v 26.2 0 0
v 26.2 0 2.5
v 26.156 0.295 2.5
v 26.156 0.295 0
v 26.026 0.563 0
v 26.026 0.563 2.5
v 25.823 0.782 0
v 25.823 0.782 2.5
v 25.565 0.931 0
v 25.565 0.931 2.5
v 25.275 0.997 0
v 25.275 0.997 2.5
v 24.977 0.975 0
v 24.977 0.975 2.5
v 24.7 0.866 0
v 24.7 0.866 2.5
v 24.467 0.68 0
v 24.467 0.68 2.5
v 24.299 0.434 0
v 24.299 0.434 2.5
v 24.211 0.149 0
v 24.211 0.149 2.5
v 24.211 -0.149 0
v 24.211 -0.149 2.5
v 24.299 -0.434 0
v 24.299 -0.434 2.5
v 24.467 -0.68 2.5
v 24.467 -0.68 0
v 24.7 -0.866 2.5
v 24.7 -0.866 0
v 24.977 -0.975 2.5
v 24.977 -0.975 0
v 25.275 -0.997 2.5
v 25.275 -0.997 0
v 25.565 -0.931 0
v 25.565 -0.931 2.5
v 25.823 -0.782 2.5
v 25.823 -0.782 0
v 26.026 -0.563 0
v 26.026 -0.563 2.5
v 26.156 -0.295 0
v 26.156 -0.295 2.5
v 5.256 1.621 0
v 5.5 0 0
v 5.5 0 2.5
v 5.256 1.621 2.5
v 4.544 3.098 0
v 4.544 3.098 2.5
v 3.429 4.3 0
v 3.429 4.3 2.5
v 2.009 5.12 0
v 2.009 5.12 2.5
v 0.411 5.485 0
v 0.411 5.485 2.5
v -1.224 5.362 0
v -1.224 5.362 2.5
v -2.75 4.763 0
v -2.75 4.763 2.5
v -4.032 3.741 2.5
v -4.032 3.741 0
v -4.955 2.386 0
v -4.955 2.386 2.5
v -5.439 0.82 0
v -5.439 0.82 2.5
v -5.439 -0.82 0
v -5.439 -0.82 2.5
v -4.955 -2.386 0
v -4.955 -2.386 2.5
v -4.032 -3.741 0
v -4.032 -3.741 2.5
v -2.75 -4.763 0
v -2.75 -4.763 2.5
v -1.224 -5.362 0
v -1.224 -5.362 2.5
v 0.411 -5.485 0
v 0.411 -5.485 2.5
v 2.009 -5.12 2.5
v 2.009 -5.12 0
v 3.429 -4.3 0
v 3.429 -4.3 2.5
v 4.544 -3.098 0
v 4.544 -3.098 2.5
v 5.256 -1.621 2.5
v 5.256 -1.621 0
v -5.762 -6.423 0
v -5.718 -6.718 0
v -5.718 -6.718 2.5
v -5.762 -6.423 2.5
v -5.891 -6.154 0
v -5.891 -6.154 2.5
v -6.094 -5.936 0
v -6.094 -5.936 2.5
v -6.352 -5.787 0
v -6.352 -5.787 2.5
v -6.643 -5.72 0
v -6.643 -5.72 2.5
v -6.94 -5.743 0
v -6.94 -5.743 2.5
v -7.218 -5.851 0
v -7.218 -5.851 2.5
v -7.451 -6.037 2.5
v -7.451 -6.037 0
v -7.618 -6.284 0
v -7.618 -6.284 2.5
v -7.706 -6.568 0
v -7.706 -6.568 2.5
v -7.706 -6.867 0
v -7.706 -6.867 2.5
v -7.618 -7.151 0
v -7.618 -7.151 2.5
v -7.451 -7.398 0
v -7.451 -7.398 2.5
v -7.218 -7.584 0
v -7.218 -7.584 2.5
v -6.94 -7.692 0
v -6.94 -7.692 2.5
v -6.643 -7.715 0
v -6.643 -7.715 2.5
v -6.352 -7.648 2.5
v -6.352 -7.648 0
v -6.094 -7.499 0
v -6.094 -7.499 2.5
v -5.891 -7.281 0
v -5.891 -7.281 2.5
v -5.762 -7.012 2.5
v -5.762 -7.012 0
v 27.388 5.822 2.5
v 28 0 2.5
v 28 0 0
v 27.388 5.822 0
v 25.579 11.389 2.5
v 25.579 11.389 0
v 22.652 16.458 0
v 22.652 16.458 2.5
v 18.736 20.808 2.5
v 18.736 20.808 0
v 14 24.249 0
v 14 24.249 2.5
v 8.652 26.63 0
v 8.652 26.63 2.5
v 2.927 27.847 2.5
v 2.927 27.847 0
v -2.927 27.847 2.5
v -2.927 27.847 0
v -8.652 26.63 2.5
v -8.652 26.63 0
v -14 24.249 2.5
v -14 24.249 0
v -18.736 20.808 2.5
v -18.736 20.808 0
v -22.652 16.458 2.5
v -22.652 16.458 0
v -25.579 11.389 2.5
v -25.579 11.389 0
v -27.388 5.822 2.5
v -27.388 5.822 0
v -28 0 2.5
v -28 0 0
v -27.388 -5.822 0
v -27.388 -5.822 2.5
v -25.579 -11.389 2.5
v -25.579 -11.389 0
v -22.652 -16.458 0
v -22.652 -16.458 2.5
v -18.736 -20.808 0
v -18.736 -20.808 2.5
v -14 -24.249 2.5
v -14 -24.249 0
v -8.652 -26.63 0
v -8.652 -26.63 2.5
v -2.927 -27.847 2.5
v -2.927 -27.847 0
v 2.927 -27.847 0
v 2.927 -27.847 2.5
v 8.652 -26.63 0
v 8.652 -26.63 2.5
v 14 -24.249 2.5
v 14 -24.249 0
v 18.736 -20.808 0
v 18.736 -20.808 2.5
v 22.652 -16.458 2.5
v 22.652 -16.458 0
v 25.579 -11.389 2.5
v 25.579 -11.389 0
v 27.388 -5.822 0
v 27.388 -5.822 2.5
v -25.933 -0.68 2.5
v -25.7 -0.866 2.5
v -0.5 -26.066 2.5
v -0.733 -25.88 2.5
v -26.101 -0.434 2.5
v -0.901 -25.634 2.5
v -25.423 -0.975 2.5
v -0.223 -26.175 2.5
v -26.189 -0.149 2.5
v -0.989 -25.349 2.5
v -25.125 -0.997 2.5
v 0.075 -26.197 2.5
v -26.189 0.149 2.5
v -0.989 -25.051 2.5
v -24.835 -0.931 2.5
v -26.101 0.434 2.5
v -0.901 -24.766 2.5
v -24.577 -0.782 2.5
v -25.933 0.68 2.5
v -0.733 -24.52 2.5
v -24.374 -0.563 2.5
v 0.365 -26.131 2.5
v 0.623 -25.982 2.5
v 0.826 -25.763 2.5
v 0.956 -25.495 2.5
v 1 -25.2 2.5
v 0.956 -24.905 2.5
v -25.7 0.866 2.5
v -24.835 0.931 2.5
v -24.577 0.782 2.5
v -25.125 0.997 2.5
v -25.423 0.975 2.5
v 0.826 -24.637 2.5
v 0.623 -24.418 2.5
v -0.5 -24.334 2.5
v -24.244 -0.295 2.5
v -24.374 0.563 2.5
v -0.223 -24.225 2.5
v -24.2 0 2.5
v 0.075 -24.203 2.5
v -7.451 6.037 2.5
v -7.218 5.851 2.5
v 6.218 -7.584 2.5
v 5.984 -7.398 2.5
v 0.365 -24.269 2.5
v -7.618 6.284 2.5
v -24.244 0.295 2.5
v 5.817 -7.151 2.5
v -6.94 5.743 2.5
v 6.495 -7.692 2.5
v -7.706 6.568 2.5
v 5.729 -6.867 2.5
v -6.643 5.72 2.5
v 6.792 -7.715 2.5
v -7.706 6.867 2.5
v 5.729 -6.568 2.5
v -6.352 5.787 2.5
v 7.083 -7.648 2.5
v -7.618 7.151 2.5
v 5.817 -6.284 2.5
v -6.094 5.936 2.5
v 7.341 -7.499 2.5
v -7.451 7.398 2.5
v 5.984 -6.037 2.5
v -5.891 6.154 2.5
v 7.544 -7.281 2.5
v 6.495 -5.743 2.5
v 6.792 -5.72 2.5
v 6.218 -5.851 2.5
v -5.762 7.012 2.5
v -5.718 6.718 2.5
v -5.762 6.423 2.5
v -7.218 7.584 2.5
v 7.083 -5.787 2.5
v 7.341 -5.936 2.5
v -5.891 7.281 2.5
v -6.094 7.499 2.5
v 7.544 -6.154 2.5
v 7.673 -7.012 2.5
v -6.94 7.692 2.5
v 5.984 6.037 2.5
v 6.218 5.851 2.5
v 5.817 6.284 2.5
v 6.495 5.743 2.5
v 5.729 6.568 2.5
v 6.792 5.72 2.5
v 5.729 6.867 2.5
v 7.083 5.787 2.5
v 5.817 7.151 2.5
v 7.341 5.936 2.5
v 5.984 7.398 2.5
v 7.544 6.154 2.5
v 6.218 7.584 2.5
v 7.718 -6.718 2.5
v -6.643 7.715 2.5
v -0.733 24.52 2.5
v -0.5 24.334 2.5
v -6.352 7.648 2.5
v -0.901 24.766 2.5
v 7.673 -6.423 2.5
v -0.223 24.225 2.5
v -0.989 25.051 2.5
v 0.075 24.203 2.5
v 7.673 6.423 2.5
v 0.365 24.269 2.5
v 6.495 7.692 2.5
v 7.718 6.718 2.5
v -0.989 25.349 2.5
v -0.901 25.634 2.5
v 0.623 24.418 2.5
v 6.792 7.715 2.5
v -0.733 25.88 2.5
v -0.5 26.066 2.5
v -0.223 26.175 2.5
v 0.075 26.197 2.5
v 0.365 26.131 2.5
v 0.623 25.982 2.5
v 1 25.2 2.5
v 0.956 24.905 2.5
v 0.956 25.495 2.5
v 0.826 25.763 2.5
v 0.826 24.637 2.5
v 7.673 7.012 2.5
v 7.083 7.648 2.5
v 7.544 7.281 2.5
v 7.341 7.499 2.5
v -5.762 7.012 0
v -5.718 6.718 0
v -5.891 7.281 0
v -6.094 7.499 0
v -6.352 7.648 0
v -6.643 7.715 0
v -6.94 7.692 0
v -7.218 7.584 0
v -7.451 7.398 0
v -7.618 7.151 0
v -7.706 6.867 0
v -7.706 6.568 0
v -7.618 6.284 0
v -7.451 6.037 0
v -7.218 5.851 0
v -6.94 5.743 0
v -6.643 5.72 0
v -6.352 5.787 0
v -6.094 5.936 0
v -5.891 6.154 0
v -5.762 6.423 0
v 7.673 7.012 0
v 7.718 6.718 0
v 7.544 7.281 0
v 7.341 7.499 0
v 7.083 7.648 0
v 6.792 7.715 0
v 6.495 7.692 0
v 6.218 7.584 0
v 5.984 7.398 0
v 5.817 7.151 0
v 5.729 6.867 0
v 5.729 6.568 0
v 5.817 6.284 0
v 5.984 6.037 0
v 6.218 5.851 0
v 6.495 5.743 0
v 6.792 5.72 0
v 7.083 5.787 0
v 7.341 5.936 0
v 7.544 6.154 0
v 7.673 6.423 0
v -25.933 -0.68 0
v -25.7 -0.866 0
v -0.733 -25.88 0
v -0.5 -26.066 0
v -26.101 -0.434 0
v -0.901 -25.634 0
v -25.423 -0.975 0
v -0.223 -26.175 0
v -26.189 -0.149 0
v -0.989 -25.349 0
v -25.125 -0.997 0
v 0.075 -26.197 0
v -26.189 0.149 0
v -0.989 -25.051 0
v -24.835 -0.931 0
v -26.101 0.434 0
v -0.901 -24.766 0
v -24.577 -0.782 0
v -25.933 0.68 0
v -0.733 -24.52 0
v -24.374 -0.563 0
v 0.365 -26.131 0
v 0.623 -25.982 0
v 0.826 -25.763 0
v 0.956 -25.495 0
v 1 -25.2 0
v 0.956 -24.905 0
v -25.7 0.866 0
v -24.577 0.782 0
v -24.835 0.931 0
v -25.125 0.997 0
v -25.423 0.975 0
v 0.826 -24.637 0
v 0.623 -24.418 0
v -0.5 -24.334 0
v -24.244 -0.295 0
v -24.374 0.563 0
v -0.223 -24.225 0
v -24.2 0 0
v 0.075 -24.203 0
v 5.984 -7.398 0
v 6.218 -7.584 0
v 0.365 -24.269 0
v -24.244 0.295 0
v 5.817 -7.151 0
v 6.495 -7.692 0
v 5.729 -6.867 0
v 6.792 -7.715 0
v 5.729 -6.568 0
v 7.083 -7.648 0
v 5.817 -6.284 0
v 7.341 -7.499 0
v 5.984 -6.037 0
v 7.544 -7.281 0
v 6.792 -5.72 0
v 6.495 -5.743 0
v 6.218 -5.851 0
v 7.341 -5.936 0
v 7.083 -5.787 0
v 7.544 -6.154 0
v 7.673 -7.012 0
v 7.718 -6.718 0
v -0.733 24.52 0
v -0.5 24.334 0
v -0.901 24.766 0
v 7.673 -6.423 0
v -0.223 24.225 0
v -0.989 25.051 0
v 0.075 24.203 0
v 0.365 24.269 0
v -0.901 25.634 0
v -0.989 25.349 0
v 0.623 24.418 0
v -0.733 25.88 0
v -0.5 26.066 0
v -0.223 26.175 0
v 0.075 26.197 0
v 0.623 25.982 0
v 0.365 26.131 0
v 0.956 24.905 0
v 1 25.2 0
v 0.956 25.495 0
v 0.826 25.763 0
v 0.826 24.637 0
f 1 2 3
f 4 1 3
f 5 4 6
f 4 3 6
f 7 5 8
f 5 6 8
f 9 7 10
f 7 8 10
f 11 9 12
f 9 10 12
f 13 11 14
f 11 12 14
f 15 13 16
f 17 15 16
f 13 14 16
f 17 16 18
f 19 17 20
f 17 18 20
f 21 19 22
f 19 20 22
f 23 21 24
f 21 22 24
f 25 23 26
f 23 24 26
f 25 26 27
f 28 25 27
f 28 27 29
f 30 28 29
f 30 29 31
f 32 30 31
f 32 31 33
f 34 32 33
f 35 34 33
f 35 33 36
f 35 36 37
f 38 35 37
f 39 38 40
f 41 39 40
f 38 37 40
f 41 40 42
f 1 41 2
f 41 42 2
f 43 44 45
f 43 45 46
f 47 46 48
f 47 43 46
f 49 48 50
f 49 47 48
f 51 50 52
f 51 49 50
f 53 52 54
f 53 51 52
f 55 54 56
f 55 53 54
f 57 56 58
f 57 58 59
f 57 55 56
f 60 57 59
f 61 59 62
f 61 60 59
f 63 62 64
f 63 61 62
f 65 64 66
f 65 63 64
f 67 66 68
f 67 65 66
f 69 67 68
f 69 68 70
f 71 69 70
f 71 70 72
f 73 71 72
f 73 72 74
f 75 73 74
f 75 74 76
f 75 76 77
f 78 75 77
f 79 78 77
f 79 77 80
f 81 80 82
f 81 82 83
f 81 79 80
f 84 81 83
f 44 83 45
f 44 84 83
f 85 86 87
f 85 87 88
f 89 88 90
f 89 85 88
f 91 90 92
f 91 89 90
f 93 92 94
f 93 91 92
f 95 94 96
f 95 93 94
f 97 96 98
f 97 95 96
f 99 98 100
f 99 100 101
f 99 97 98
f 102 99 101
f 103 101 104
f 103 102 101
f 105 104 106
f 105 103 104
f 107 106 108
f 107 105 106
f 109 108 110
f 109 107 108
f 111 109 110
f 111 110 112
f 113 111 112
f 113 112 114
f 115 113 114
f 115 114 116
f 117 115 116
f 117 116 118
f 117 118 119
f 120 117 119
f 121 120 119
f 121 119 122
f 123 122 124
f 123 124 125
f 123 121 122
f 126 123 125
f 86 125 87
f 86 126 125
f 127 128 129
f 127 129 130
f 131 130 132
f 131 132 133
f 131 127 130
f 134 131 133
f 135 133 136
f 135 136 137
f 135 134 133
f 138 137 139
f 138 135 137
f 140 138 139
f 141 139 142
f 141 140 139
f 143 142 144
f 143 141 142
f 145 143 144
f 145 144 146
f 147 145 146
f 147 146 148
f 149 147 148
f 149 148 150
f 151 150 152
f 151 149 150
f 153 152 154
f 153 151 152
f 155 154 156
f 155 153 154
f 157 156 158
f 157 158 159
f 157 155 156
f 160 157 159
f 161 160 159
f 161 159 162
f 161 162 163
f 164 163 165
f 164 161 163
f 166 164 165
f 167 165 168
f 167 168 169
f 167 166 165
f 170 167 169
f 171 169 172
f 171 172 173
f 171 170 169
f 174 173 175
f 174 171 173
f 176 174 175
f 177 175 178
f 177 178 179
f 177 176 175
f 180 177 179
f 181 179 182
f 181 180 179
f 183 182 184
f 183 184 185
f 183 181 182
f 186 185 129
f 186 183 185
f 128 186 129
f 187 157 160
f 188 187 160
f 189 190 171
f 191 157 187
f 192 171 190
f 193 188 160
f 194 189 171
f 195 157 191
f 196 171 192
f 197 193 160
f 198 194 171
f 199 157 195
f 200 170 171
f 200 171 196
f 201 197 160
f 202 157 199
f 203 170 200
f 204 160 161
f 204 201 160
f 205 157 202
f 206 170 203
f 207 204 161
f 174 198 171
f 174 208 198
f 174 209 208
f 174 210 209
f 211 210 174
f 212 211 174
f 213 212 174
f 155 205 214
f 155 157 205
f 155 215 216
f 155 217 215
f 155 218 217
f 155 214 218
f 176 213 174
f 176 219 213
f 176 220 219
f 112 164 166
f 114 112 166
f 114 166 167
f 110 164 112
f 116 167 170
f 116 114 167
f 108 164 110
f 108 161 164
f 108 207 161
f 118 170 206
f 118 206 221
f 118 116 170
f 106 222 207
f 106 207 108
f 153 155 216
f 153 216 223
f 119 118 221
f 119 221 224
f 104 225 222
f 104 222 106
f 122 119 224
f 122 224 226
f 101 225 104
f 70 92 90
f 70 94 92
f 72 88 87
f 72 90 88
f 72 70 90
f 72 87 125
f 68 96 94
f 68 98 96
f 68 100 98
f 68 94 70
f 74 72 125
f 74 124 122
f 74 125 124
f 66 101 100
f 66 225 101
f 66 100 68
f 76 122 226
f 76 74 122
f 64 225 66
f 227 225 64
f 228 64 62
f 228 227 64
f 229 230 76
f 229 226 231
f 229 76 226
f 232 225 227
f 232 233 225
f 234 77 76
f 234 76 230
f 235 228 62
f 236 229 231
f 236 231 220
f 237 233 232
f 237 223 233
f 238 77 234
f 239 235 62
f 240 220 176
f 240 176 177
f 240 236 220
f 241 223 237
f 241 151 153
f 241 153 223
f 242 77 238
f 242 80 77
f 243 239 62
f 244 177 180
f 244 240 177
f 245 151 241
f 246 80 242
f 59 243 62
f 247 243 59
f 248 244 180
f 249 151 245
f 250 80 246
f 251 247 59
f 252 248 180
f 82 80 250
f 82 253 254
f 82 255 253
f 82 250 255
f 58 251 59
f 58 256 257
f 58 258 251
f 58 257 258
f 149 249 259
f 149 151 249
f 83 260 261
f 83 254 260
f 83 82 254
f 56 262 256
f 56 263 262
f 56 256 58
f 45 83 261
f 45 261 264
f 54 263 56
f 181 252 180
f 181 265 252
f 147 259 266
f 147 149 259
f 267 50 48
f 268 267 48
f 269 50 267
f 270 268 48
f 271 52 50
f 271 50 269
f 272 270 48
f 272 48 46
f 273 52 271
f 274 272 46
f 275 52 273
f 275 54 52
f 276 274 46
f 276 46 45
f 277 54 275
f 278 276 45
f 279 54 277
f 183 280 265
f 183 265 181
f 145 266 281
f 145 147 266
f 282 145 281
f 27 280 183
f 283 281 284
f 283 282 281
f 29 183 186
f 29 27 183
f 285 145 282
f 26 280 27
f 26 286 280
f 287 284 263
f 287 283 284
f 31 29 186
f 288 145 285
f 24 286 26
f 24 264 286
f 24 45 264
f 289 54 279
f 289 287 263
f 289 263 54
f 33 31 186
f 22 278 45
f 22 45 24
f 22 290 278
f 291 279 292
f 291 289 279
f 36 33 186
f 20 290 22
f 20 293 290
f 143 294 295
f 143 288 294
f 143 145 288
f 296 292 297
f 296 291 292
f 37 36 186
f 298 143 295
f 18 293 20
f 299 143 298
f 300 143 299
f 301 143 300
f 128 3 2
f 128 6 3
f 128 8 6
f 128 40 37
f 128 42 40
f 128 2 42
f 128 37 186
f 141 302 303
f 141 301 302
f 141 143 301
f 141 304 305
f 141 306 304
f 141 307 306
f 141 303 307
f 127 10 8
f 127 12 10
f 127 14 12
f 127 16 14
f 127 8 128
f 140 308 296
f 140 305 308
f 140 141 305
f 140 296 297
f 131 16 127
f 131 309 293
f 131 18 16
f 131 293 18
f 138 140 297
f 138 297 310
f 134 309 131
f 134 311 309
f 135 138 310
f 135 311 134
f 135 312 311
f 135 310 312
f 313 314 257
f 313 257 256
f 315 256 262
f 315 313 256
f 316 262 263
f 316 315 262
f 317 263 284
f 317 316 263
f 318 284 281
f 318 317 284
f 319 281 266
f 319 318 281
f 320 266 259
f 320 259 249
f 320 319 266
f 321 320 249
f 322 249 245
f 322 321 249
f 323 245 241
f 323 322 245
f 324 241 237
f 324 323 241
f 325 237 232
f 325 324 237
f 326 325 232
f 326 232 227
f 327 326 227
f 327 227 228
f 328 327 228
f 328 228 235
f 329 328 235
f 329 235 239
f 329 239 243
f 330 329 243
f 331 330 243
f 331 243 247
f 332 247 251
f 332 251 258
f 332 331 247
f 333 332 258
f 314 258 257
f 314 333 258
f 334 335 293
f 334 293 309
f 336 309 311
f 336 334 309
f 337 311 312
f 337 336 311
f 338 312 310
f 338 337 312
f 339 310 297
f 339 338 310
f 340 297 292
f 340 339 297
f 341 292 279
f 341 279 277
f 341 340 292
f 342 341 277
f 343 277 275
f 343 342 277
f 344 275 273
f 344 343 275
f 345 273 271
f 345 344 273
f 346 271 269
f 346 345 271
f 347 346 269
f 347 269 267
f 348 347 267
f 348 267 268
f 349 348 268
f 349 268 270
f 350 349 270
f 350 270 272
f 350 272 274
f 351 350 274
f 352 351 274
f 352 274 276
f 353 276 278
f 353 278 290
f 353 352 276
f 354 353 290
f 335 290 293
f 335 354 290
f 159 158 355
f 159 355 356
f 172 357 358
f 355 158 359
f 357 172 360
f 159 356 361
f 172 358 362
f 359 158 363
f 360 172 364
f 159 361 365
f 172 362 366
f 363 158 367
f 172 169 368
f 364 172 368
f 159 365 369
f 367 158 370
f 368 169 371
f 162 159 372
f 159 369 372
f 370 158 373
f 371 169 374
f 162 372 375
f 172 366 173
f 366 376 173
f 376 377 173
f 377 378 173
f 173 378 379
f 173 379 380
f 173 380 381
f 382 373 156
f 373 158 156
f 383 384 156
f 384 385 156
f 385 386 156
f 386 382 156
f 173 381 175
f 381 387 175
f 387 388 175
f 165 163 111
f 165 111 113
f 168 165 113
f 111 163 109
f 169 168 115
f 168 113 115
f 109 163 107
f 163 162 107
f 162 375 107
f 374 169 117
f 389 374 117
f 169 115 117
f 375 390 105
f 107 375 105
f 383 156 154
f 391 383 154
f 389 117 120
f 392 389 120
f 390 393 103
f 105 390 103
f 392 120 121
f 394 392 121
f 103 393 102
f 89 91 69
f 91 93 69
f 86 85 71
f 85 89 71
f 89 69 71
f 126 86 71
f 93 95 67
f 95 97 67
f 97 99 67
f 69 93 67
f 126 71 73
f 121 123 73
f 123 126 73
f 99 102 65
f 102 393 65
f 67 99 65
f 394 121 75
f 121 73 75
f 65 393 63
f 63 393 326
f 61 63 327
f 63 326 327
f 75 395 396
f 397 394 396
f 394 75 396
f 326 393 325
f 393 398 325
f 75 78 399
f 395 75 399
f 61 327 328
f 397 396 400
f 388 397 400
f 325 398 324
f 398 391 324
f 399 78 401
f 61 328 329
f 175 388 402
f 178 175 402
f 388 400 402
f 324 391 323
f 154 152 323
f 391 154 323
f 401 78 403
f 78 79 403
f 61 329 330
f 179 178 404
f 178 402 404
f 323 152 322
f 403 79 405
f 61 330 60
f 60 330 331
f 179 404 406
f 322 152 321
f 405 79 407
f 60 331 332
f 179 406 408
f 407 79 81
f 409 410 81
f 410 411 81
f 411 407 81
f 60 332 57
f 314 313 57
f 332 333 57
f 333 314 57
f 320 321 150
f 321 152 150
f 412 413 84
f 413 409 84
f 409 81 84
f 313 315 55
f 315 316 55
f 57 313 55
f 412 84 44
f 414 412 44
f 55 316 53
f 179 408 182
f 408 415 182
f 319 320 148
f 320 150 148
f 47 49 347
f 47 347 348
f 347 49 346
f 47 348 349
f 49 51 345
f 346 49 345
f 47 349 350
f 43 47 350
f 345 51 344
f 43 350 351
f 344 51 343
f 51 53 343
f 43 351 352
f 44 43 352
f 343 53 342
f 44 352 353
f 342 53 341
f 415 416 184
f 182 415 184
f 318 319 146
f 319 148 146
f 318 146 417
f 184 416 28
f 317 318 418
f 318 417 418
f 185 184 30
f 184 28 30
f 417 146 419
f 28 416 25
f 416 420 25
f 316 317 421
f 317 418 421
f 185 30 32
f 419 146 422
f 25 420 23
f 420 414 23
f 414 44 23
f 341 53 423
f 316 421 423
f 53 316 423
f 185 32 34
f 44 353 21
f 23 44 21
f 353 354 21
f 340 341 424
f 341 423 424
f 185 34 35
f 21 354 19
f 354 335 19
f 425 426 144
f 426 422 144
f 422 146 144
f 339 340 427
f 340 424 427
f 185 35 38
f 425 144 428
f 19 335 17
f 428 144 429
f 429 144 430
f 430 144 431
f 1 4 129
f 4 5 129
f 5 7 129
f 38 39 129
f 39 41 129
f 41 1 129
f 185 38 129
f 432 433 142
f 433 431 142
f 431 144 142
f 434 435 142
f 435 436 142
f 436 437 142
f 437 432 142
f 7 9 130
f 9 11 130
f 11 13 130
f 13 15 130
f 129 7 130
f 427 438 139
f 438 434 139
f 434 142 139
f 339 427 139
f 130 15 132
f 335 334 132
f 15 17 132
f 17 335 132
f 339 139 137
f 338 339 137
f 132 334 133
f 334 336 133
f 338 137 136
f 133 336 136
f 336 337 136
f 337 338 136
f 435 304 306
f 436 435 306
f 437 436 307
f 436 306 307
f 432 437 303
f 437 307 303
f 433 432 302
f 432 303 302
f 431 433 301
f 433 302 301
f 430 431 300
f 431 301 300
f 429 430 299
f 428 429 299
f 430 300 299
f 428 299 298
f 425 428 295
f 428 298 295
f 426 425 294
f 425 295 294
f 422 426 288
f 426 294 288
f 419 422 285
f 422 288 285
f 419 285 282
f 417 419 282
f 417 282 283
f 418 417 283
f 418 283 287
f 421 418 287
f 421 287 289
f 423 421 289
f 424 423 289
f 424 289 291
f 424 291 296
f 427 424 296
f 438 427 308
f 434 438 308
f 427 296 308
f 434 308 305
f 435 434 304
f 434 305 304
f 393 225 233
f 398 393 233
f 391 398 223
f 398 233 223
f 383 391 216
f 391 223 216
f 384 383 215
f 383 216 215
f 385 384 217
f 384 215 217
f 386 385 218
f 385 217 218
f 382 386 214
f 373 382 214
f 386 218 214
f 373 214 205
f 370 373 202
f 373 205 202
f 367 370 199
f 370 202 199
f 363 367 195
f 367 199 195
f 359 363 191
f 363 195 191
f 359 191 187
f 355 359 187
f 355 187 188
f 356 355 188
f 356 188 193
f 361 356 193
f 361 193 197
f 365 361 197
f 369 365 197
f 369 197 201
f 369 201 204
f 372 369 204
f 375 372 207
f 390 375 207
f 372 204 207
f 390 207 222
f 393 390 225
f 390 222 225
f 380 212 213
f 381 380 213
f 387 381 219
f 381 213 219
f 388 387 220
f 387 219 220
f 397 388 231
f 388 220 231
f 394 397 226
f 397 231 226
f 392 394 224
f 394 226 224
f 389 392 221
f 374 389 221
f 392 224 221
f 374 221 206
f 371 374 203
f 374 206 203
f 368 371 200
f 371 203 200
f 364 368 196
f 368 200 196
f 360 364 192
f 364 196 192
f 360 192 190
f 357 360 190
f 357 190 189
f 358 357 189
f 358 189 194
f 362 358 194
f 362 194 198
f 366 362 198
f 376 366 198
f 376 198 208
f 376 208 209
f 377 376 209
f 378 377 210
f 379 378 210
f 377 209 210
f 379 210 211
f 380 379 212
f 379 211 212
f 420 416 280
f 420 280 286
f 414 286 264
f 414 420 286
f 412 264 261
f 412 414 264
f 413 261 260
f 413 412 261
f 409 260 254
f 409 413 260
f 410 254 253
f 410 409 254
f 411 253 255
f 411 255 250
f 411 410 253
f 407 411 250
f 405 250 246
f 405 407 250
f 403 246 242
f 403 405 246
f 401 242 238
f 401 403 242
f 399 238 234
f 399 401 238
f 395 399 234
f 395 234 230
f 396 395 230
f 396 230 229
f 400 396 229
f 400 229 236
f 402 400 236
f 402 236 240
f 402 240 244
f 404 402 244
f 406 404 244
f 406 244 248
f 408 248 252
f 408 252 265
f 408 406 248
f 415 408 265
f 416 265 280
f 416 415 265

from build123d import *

# Parameters (mm, degrees)
CROQUIS1_W              = 65
CROQUIS1_H              = 65
CROQUIS1_R              = 5.5
CROQUIS1_R_2            = 1
SALIENTE_EXTRUIR1_DEPTH = 2.5
REDONDEO1_R             = 15
CROQUIS5_R              = 47.665857464
CROQUIS5_R_2            = 28
CORTAR_EXTRUIR3_DEPTH   = 2.5
CROQUIS7_R              = 1
CORTAR_EXTRUIR4_DEPTH   = 2.5


with BuildPart() as part:
    # Croquis1 → Saliente-Extruir1 (new body)
    with BuildSketch(Plane.XY):
        Rectangle(CROQUIS1_W, CROQUIS1_H)
        Circle(CROQUIS1_R, mode=Mode.SUBTRACT)
        with Locations((-6.717514421, 6.717514421)):
            Circle(CROQUIS1_R_2, mode=Mode.SUBTRACT)
        with Locations((6.717514421, 6.717514421)):
            Circle(CROQUIS1_R_2, mode=Mode.SUBTRACT)
        with Locations((6.717514421, -6.717514421)):
            Circle(CROQUIS1_R_2, mode=Mode.SUBTRACT)
        with Locations((-6.717514421, -6.717514421)):
            Circle(CROQUIS1_R_2, mode=Mode.SUBTRACT)
    extrude(amount=SALIENTE_EXTRUIR1_DEPTH)

    # Redondeo1
    redondeo1_edges = [part.edges().sort_by_distance(p)[0] for p in [
        (32.5, -32.5, 1.25),
        (-32.5, -32.5, 1.25),
        (-32.5, 32.5, 1.25),
        (32.5, 32.5, 1.25),
    ]]
    fillet(redondeo1_edges, radius=REDONDEO1_R)

    # Croquis5 → Cortar-Extruir3 (cut)
    with BuildSketch(Plane.XY.offset(2.5)):
        Circle(CROQUIS5_R)
        Circle(CROQUIS5_R_2, mode=Mode.SUBTRACT)
    extrude(amount=-CORTAR_EXTRUIR3_DEPTH, mode=Mode.SUBTRACT)

    # Croquis7 → Cortar-Extruir4 (cut)
    with BuildSketch(Plane.XY.offset(2.5)):
        with Locations((0, 25.2)):
            Circle(CROQUIS7_R)
        with Locations((25.2, 0)):
            Circle(CROQUIS7_R)
        with Locations((0, -25.2)):
            Circle(CROQUIS7_R)
        with Locations((-25.2, 0)):
            Circle(CROQUIS7_R)
    extrude(amount=-CORTAR_EXTRUIR4_DEPTH, mode=Mode.SUBTRACT)


solid = part.part
